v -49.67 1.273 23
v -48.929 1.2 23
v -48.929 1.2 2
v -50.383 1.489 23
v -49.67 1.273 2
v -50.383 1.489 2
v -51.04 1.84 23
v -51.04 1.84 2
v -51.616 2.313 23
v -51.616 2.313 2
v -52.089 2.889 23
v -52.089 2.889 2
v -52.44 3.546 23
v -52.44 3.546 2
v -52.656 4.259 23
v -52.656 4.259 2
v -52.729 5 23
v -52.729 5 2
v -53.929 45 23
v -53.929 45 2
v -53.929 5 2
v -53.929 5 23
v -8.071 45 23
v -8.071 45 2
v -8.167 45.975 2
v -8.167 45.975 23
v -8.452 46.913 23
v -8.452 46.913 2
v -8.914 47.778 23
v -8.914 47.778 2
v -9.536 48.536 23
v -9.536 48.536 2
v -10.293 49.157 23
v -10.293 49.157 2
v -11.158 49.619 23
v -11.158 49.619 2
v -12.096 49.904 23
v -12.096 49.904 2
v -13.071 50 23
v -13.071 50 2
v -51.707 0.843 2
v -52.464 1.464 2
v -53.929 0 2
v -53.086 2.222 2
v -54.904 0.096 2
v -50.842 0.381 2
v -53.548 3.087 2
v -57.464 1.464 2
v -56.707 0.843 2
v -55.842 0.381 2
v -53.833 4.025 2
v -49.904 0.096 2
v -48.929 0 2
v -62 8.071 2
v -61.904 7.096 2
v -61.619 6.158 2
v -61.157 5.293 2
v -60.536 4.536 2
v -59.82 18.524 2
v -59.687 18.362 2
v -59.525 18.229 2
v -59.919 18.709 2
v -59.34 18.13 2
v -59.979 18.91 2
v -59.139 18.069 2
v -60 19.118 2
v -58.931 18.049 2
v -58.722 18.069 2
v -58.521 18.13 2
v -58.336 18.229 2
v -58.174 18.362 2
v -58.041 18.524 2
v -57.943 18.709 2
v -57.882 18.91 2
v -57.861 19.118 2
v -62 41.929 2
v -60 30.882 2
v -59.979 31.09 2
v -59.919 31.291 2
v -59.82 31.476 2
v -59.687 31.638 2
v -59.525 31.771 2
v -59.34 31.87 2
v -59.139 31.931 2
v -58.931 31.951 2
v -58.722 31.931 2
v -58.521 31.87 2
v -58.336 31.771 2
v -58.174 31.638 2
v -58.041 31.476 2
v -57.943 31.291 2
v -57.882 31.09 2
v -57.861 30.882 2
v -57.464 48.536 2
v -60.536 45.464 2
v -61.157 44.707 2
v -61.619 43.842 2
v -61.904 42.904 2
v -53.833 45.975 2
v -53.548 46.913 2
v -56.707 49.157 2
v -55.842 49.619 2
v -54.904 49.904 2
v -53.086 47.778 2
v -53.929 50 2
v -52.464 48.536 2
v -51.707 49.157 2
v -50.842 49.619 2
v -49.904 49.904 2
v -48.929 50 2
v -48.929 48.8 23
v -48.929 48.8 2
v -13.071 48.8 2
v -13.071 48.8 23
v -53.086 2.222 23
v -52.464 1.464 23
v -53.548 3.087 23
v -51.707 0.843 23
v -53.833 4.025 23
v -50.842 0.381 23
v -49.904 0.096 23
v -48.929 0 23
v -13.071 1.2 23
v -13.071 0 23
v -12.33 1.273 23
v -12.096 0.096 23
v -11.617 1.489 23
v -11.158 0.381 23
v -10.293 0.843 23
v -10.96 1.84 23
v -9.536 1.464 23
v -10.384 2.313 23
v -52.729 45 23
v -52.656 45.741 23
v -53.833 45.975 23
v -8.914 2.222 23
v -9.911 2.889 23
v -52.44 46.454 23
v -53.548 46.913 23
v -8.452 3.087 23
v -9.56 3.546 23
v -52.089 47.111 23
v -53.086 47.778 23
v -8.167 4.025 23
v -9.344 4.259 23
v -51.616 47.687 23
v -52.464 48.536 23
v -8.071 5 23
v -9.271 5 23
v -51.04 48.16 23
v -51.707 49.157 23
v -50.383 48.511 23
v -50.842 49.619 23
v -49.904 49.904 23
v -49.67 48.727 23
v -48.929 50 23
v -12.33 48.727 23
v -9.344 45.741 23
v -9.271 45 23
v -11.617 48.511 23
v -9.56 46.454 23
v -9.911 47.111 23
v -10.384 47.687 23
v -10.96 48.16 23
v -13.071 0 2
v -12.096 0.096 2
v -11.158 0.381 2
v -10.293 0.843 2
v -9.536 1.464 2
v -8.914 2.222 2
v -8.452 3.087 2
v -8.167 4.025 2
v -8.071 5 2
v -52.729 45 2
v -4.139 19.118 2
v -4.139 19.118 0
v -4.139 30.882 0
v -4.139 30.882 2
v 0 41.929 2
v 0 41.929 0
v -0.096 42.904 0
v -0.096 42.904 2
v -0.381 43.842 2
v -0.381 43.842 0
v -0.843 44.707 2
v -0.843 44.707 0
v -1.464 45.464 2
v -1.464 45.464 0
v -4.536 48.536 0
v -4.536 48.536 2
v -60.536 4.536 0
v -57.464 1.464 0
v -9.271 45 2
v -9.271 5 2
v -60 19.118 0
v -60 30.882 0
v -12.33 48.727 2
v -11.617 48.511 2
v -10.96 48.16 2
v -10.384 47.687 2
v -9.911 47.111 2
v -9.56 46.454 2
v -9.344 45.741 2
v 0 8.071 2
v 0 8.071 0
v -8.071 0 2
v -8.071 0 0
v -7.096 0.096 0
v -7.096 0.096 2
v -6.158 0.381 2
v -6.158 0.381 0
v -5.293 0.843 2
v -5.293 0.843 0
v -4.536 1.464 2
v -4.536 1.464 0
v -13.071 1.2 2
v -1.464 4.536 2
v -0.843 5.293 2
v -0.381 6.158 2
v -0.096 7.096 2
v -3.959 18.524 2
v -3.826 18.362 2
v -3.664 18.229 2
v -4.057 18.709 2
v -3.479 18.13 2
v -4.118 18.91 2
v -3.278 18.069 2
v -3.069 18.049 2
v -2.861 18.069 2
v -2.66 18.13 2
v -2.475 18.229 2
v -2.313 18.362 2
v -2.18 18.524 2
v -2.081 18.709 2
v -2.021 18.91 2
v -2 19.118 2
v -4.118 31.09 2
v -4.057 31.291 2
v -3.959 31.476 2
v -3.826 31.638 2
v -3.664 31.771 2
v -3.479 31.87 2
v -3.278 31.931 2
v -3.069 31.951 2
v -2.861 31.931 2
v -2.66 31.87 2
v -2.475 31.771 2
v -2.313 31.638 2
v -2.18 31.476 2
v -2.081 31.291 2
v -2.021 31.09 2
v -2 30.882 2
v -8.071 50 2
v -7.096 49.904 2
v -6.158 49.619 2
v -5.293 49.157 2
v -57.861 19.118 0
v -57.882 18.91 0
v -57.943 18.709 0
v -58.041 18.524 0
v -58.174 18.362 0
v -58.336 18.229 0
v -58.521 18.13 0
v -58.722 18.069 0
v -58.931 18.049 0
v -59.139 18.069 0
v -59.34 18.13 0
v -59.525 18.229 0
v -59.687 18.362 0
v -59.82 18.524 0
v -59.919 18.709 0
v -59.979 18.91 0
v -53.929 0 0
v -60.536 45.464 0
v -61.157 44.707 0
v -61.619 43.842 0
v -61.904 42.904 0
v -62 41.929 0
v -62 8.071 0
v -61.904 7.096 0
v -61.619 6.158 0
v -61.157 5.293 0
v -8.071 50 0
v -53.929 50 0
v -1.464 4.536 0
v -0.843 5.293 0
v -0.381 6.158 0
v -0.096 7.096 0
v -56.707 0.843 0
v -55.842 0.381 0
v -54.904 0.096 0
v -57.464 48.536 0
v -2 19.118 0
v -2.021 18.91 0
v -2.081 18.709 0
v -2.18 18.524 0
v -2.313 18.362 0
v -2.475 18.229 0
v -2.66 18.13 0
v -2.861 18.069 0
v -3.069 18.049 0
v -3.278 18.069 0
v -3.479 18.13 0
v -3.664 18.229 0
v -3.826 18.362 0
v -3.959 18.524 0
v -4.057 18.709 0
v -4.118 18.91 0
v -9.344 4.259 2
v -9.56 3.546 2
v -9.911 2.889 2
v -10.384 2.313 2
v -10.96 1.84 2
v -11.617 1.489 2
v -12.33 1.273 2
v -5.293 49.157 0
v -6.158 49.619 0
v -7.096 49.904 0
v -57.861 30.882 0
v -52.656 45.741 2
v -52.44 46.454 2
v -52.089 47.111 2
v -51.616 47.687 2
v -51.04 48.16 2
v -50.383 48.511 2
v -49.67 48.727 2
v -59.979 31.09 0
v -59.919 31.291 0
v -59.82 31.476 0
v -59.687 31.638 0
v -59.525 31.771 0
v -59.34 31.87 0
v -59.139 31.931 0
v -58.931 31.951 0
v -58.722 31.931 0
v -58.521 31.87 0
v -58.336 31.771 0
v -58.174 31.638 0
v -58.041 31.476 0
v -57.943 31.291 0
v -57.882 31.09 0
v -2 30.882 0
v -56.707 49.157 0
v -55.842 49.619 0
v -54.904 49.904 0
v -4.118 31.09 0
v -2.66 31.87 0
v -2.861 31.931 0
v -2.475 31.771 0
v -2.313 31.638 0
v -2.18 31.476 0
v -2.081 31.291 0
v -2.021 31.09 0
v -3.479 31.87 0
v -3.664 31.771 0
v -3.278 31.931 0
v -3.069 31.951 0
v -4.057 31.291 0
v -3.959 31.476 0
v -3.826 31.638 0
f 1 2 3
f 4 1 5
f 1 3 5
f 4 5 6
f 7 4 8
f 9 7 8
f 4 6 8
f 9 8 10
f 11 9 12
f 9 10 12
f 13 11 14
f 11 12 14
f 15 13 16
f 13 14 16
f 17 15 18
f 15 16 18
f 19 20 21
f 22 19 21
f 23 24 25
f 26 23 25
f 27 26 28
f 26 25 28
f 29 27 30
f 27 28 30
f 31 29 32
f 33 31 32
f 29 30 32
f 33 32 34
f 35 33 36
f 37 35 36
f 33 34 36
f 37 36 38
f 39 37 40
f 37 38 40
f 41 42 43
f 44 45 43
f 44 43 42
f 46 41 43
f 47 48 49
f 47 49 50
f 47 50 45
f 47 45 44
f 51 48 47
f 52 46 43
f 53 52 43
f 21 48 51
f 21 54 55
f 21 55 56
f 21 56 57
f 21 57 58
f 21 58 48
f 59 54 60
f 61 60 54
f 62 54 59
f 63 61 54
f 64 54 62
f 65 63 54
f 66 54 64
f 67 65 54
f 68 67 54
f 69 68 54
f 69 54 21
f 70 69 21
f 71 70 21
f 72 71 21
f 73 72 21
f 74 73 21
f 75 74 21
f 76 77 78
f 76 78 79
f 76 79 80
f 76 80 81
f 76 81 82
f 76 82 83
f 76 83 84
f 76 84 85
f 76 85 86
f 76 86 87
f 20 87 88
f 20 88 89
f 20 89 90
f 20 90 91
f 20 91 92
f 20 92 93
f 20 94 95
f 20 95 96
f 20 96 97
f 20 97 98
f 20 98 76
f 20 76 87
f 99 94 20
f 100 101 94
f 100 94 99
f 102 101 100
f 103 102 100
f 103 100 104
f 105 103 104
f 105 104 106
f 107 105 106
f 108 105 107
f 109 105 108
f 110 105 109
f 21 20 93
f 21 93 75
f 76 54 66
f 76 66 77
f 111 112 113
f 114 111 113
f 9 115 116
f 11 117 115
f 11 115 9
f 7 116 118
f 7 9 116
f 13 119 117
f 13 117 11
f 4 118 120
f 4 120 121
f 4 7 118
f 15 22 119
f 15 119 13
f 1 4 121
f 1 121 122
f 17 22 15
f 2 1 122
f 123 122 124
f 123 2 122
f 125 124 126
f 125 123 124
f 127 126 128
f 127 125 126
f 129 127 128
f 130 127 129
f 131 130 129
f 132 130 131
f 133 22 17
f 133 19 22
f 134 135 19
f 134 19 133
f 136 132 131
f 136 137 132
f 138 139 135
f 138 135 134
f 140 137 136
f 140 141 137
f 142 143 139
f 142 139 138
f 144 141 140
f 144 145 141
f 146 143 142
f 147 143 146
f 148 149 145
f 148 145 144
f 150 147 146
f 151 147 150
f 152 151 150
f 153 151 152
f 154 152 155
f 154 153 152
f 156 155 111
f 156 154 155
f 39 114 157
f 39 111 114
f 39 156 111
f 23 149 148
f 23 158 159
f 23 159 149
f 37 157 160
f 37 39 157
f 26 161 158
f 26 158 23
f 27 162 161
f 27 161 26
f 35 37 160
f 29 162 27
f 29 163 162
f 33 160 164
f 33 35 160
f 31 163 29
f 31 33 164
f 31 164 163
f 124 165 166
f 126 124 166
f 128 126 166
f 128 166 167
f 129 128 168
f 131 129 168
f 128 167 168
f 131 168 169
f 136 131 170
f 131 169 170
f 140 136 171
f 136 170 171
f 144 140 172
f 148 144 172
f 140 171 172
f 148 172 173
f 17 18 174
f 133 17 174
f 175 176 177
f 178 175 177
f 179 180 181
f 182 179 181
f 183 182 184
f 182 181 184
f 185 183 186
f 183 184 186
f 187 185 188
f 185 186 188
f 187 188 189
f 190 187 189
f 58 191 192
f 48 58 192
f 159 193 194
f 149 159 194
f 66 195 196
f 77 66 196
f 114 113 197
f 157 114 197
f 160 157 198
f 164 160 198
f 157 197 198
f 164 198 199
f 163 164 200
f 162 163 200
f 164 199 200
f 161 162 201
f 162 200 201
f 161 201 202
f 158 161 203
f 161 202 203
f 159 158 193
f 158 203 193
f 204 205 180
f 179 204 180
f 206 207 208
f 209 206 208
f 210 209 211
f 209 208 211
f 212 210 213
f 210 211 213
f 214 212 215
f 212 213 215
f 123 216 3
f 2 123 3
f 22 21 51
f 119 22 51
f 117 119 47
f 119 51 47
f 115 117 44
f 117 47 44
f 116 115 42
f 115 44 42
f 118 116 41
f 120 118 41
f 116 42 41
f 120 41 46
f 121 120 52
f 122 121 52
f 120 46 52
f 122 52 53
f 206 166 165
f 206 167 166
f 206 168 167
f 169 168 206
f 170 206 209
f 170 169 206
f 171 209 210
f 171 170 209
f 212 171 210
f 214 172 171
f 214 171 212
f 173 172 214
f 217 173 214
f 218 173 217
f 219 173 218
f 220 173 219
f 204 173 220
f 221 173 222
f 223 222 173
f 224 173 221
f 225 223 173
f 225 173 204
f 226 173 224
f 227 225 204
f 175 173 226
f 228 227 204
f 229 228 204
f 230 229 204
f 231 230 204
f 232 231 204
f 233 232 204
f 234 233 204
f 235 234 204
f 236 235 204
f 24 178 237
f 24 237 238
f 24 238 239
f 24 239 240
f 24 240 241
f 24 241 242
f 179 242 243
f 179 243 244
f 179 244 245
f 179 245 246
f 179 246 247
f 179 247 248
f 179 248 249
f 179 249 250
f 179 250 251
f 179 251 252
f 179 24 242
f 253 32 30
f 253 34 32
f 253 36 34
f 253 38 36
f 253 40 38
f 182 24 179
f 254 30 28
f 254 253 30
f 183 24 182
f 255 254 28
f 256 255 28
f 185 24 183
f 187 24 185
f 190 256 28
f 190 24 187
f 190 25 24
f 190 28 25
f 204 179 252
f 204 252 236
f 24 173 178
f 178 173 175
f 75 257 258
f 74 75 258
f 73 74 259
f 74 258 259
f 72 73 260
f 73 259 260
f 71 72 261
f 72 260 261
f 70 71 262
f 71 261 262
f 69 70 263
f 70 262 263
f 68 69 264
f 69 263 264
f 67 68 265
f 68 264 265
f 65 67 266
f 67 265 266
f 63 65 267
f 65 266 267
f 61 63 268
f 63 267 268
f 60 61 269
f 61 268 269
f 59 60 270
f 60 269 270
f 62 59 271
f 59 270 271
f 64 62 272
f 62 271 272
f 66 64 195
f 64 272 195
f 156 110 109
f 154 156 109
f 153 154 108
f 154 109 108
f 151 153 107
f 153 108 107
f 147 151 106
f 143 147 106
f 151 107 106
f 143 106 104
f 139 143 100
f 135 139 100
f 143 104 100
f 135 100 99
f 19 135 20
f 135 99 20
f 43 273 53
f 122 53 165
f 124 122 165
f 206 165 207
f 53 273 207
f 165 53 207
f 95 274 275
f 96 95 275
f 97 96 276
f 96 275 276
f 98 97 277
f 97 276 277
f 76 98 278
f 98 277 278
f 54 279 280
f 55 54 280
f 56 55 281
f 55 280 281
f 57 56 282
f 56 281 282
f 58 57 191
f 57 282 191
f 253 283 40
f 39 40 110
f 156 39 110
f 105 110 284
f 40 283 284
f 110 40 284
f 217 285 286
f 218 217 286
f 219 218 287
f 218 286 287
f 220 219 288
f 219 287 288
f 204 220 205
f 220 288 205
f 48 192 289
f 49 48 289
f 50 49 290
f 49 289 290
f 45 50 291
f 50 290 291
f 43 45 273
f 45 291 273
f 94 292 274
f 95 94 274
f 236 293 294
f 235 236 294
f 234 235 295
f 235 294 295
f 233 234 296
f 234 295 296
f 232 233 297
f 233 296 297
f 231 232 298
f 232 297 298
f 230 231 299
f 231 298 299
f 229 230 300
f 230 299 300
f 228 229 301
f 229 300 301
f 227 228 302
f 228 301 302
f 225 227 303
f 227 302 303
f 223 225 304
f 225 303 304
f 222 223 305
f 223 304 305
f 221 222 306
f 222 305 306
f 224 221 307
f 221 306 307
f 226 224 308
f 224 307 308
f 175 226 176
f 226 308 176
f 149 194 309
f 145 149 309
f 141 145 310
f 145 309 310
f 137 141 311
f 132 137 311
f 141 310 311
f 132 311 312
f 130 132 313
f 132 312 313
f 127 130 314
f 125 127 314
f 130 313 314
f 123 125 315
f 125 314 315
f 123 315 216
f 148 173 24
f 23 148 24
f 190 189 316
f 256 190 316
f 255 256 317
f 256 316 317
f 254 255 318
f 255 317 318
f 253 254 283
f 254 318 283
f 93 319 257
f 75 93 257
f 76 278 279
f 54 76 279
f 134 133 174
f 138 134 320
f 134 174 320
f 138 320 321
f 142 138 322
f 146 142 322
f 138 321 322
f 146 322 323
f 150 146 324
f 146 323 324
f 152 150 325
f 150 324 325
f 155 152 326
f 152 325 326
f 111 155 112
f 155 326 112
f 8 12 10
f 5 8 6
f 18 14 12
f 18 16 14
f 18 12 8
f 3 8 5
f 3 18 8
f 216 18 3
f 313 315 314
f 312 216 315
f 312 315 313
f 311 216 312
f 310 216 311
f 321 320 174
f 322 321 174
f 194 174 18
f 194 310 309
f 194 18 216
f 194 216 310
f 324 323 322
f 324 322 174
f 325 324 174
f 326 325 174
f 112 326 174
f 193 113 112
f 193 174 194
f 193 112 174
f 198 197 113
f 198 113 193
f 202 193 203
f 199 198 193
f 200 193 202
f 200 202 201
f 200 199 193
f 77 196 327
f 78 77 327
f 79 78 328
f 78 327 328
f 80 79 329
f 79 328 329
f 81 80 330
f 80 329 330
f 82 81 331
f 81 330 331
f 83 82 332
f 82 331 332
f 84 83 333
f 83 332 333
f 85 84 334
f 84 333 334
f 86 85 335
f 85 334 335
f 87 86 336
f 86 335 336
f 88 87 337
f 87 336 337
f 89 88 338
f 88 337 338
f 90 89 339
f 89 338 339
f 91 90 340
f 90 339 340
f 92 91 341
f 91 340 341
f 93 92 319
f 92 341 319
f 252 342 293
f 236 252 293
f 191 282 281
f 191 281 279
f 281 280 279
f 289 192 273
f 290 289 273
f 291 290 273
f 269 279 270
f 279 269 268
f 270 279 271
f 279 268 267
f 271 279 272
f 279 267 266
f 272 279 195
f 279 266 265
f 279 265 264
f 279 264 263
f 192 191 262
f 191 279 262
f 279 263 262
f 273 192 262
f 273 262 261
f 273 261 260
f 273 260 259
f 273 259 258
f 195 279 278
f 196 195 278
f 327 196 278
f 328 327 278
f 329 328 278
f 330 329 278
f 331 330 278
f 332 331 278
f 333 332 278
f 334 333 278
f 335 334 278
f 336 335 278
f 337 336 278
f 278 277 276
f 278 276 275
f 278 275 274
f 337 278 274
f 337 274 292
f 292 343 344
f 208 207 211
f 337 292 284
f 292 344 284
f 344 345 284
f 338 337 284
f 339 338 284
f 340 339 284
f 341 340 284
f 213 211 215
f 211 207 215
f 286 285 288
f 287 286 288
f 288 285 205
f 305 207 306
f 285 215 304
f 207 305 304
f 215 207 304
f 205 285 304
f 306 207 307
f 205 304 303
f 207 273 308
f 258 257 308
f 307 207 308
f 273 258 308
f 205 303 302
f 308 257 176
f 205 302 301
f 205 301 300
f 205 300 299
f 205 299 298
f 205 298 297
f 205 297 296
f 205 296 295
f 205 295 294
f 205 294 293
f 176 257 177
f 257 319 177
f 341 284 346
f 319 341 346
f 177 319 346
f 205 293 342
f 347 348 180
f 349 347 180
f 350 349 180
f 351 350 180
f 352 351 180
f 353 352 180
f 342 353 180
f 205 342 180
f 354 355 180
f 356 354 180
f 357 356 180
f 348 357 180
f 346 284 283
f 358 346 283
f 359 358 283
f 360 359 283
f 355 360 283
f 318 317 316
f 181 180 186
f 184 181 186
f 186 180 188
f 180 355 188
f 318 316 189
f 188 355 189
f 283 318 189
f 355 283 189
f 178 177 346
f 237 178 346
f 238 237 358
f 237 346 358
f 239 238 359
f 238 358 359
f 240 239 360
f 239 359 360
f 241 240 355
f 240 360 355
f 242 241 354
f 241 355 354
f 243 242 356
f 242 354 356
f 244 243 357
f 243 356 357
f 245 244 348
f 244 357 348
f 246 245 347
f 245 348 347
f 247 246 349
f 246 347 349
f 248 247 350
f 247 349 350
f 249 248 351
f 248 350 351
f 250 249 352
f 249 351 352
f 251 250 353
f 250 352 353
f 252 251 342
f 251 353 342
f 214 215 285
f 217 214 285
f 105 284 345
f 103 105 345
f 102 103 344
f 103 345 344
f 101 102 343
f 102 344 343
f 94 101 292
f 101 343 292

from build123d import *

# Parameters (mm, degrees)
F1_DEPTH = 2
F3_DEPTH = 21


with BuildPart() as f1:
    # F0 (on Top) → F1 (new body)
    with BuildSketch(Plane.XY):
        with BuildLine():
            Line((-60.535534, 4.535534), (-57.464466, 1.464466))
            ThreePointArc((-57.464466, 1.464466), (-55.842349, 0.380602), (-53.928932, 0))
            Line((-53.928932, 0), (-8.071068, 0))
            ThreePointArc((-8.071068, 0), (-6.157651, 0.380602), (-4.535534, 1.464466))
            Line((-4.535534, 1.464466), (-1.464466, 4.535534))
            ThreePointArc((-1.464466, 4.535534), (-0.380602, 6.157651), (0, 8.071068))
            Line((0, 8.071068), (0, 41.928932))
            ThreePointArc((0, 41.928932), (-0.380602, 43.842349), (-1.464466, 45.464466))
            Line((-1.464466, 45.464466), (-4.535534, 48.535534))
            ThreePointArc((-4.535534, 48.535534), (-6.157651, 49.619398), (-8.071068, 50))
            Line((-8.071068, 50), (-53.928932, 50))
            ThreePointArc((-53.928932, 50), (-55.842349, 49.619398), (-57.464466, 48.535534))
            Line((-57.464466, 48.535534), (-60.535534, 45.464466))
            ThreePointArc((-60.535534, 45.464466), (-61.619398, 43.842349), (-62, 41.928932))
            Line((-62, 41.928932), (-62, 8.071068))
            ThreePointArc((-62, 8.071068), (-61.619398, 6.157651), (-60.535534, 4.535534))
        make_face()
        with BuildLine():
            Line((-60, 19.118238), (-60, 30.881762))
            ThreePointArc((-60, 30.881762), (-58.930589, 31.951173), (-57.861177, 30.881762))
            Line((-57.861177, 30.881762), (-57.861177, 19.118238))
            ThreePointArc((-57.861177, 19.118238), (-58.930589, 18.048827), (-60, 19.118238))
        make_face(mode=Mode.SUBTRACT)
        with BuildLine():
            Line((-4.138823, 19.118238), (-4.138823, 30.881762))
            ThreePointArc((-4.138823, 30.881762), (-3.069411, 31.951173), (-2, 30.881762))
            Line((-2, 30.881762), (-2, 19.118238))
            ThreePointArc((-2, 19.118238), (-3.069411, 18.048827), (-4.138823, 19.118238))
        make_face(mode=Mode.SUBTRACT)
    extrude(amount=F1_DEPTH)

    # F2 (on face) → F3 (join)
    with BuildSketch(Plane.XY.offset(2)):
        with BuildLine():
            ThreePointArc((-13.071068, 0), (-9.535534, 1.464466), (-8.071068, 5))
            Line((-8.071068, 5), (-8.071068, 45))
            ThreePointArc((-8.071068, 45), (-9.535534, 48.535534), (-13.071068, 50))
            Line((-13.071068, 50), (-48.928932, 50))
            ThreePointArc((-48.928932, 50), (-52.464466, 48.535534), (-53.928932, 45))
            Line((-53.928932, 45), (-53.928932, 5))
            ThreePointArc((-53.928932, 5), (-52.464466, 1.464466), (-48.928932, 0))
            Line((-48.928932, 0), (-13.071068, 0))
        make_face()
        with BuildLine():
            Line((-9.271068, 45), (-9.271068, 5))
            ThreePointArc((-9.271068, 5), (-10.384062, 2.312995), (-13.071068, 1.200001))
            Line((-13.071068, 1.200001), (-48.928932, 1.200001))
            ThreePointArc((-48.928932, 1.200001), (-51.615938, 2.312995), (-52.728932, 5))
            Line((-52.728932, 5), (-52.728932, 45))
            ThreePointArc((-52.728932, 45), (-51.615938, 47.687005), (-48.928932, 48.799999))
            Line((-48.928932, 48.799999), (-13.071068, 48.799999))
            ThreePointArc((-13.071068, 48.799999), (-10.384062, 47.687005), (-9.271068, 45))
        make_face(mode=Mode.SUBTRACT)
    extrude(amount=F3_DEPTH)


solid = f1.part
